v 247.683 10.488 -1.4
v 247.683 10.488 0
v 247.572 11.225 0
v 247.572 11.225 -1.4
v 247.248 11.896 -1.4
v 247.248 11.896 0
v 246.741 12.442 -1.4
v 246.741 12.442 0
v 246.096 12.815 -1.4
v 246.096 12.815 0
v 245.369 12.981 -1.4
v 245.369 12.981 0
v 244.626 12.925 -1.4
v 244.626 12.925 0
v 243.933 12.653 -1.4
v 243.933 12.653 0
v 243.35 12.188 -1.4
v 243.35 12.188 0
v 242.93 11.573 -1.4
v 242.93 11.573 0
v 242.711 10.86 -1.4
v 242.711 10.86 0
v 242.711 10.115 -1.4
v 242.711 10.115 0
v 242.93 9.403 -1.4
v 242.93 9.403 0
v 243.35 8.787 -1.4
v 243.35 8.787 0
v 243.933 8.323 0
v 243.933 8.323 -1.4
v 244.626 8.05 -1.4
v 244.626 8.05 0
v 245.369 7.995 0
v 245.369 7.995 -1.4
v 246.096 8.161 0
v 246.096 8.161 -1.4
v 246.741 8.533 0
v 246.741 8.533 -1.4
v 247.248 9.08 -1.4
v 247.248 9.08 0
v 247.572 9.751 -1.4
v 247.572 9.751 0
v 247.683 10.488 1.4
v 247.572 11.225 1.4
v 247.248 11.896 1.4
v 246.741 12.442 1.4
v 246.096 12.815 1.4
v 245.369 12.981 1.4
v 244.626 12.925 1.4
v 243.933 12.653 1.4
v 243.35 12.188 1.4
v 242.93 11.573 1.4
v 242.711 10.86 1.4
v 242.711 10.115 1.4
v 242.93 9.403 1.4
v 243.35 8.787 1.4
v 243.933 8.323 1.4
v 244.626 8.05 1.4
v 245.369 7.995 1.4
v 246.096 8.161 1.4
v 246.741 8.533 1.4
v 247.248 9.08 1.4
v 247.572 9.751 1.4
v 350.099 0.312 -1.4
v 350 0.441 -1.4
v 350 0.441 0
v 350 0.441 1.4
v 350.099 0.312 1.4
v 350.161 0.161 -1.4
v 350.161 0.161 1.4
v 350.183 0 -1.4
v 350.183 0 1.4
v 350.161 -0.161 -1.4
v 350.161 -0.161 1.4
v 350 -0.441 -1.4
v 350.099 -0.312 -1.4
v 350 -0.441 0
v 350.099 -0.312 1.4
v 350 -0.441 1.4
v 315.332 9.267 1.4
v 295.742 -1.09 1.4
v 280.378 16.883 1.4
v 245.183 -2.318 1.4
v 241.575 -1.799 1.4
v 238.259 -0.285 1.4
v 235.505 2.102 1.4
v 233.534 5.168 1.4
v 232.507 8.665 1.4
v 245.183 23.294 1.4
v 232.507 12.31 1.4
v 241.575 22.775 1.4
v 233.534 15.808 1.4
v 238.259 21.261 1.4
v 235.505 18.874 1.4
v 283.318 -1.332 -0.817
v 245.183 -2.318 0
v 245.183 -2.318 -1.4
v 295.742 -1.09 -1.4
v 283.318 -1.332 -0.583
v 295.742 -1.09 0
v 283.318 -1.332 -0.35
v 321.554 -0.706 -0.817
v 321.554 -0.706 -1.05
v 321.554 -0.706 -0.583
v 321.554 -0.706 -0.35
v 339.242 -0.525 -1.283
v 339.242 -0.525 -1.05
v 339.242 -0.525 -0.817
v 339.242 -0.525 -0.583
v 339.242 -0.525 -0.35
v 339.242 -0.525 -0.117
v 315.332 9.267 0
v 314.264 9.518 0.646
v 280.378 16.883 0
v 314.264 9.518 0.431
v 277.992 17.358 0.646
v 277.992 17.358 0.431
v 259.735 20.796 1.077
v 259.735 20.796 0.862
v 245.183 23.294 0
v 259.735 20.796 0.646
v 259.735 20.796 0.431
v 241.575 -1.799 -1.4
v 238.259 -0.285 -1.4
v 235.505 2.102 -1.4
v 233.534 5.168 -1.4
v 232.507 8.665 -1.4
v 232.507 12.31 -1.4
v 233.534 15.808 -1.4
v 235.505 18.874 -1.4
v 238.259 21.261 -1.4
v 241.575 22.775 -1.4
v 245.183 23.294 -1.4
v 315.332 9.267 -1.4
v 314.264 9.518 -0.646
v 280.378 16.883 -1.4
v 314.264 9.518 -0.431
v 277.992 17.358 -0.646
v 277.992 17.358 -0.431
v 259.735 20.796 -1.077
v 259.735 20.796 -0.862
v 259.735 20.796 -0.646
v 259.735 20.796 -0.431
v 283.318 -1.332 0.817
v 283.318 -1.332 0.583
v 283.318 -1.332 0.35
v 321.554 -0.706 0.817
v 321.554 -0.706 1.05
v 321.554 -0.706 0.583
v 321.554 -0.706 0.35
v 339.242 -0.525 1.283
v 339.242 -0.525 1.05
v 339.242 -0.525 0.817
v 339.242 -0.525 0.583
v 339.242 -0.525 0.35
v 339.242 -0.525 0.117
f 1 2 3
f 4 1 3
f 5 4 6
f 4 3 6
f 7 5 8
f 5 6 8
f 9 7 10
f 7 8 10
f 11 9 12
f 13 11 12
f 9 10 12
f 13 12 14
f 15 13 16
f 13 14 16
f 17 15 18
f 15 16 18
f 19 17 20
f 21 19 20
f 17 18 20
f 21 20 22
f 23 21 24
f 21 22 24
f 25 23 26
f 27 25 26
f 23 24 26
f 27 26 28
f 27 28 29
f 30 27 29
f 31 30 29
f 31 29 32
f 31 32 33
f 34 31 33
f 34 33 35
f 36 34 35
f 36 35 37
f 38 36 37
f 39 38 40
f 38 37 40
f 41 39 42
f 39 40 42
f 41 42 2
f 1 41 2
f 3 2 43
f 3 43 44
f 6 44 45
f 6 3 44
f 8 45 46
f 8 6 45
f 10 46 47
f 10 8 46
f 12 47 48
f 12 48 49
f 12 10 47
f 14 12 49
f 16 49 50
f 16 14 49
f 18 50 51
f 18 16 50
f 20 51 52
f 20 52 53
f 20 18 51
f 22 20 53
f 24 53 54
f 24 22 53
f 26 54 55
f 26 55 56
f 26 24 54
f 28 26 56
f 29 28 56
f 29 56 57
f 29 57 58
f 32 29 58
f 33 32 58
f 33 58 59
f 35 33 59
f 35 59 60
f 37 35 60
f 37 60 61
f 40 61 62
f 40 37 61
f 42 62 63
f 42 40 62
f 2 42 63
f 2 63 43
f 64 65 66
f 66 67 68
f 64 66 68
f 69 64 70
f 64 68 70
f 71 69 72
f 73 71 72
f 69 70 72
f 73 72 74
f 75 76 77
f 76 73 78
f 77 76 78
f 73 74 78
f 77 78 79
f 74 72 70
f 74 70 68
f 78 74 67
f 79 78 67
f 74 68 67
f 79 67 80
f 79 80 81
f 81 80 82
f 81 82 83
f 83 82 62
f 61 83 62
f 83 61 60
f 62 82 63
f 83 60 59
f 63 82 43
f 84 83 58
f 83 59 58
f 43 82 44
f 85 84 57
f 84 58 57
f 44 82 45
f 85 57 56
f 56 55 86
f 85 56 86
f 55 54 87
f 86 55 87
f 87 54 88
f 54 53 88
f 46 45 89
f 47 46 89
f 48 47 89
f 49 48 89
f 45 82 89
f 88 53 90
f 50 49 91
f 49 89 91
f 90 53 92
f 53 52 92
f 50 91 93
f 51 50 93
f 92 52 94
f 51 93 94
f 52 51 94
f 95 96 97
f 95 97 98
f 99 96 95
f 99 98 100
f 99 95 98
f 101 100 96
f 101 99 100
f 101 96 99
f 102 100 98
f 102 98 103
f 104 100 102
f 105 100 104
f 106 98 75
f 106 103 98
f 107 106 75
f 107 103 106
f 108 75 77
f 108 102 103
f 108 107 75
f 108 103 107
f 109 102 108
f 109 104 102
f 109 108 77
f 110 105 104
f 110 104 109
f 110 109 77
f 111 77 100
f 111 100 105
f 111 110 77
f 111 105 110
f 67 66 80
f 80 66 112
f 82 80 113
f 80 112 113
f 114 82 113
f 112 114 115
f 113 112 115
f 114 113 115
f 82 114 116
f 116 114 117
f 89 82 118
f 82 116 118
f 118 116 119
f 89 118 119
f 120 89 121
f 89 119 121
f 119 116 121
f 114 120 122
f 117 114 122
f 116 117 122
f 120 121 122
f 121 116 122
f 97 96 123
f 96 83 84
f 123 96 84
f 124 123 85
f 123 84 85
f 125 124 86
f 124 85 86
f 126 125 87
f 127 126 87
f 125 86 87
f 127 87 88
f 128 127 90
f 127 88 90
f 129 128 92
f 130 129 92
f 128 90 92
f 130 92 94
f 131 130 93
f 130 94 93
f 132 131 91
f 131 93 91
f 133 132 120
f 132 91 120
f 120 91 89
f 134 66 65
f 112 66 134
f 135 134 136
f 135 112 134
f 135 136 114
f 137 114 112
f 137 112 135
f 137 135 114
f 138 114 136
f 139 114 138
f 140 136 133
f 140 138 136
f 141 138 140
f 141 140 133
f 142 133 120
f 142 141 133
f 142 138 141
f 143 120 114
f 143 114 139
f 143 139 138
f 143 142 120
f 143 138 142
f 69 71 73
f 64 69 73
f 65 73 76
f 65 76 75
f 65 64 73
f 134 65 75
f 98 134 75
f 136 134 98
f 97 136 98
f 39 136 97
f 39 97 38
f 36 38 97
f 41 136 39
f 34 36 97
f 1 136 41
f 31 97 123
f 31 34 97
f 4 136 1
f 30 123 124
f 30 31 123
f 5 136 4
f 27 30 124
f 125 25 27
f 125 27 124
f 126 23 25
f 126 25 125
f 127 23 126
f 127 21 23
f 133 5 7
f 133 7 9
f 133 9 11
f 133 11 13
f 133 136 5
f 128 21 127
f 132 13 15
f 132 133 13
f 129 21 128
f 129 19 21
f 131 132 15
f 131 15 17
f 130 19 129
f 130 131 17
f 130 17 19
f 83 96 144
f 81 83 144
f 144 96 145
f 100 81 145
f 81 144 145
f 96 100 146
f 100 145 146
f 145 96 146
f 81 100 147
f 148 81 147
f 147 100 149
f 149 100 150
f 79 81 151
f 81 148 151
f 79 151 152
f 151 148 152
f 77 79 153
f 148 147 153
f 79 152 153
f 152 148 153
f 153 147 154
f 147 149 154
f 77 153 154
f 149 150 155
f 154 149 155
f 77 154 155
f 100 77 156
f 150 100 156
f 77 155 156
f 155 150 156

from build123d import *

# Parameters (mm, degrees)
SKETCH_2_R      = 2.5
EXTRUDE_1_DEPTH = 1.4


with BuildPart() as part:
    # Эскиз2 → Бобышка-Вытянуть1 (new body, symmetric)
    with BuildSketch(Plane.XY):
        with BuildLine():
            ThreePointArc((350, 0.441), (350.182668182, 0), (350, -0.441))
            add(Edge.make_bspline(
                [(245.182668182, -2.318077567), (248.299487738, -2.222776548), (254.6148421, -2.036682455), (264.128528247, -1.778536728), (273.723303235, -1.541558038), (283.317346051, -1.328064065), (292.909735844, -1.138021673), (302.493517153, -0.971016602), (312.041013985, -0.826421034), (321.464682241, -0.704096652), (330.522295396, -0.604119869), (338.773087678, -0.527128646), (345.182558015, -0.475350241), (348.76868735, -0.44977974), (350, -0.441)],
                knots=[0.704555577, 0.704555577, 0.704555577, 0.704555577, 0.730918775, 0.757971338, 0.785017763, 0.812061651, 0.839103366, 0.866131651, 0.893099152, 0.919831065, 0.945809917, 0.969680601, 0.989589706, 1, 1, 1, 1], degree=3))
            ThreePointArc((245.182668182, -2.318077567), (232.376774993, 10.487815621), (245.182668182, 23.29370881))
            add(Edge.make_bspline(
                [(350, 0.441), (348.817934836, 0.763027745), (345.408245977, 1.69192274), (339.347864917, 3.301674674), (331.589665686, 5.302675511), (323.091885591, 7.417212373), (314.238285126, 9.538012439), (305.242760894, 11.608254886), (296.187367062, 13.60762908), (287.101376113, 15.529324906), (277.995159278, 17.370991017), (268.873317879, 19.131417094), (259.738667962, 20.809730625), (251.840157462, 22.18732961), (246.985652296, 22.997756578), (245.182668182, 23.29370881)],
                knots=[0, 0, 0, 0, 0.0101622, 0.029313053, 0.052011605, 0.076619468, 0.101948061, 0.127526132, 0.153184131, 0.178867888, 0.204557903, 0.230245712, 0.255925967, 0.281594302, 0.296749598, 0.296749598, 0.296749598, 0.296749598], degree=3))
        make_face()
        with Locations((245.182668182, 10.487815621)):
            Circle(SKETCH_2_R, mode=Mode.SUBTRACT)
    extrude(amount=EXTRUDE_1_DEPTH, both=True)


solid = part.part
